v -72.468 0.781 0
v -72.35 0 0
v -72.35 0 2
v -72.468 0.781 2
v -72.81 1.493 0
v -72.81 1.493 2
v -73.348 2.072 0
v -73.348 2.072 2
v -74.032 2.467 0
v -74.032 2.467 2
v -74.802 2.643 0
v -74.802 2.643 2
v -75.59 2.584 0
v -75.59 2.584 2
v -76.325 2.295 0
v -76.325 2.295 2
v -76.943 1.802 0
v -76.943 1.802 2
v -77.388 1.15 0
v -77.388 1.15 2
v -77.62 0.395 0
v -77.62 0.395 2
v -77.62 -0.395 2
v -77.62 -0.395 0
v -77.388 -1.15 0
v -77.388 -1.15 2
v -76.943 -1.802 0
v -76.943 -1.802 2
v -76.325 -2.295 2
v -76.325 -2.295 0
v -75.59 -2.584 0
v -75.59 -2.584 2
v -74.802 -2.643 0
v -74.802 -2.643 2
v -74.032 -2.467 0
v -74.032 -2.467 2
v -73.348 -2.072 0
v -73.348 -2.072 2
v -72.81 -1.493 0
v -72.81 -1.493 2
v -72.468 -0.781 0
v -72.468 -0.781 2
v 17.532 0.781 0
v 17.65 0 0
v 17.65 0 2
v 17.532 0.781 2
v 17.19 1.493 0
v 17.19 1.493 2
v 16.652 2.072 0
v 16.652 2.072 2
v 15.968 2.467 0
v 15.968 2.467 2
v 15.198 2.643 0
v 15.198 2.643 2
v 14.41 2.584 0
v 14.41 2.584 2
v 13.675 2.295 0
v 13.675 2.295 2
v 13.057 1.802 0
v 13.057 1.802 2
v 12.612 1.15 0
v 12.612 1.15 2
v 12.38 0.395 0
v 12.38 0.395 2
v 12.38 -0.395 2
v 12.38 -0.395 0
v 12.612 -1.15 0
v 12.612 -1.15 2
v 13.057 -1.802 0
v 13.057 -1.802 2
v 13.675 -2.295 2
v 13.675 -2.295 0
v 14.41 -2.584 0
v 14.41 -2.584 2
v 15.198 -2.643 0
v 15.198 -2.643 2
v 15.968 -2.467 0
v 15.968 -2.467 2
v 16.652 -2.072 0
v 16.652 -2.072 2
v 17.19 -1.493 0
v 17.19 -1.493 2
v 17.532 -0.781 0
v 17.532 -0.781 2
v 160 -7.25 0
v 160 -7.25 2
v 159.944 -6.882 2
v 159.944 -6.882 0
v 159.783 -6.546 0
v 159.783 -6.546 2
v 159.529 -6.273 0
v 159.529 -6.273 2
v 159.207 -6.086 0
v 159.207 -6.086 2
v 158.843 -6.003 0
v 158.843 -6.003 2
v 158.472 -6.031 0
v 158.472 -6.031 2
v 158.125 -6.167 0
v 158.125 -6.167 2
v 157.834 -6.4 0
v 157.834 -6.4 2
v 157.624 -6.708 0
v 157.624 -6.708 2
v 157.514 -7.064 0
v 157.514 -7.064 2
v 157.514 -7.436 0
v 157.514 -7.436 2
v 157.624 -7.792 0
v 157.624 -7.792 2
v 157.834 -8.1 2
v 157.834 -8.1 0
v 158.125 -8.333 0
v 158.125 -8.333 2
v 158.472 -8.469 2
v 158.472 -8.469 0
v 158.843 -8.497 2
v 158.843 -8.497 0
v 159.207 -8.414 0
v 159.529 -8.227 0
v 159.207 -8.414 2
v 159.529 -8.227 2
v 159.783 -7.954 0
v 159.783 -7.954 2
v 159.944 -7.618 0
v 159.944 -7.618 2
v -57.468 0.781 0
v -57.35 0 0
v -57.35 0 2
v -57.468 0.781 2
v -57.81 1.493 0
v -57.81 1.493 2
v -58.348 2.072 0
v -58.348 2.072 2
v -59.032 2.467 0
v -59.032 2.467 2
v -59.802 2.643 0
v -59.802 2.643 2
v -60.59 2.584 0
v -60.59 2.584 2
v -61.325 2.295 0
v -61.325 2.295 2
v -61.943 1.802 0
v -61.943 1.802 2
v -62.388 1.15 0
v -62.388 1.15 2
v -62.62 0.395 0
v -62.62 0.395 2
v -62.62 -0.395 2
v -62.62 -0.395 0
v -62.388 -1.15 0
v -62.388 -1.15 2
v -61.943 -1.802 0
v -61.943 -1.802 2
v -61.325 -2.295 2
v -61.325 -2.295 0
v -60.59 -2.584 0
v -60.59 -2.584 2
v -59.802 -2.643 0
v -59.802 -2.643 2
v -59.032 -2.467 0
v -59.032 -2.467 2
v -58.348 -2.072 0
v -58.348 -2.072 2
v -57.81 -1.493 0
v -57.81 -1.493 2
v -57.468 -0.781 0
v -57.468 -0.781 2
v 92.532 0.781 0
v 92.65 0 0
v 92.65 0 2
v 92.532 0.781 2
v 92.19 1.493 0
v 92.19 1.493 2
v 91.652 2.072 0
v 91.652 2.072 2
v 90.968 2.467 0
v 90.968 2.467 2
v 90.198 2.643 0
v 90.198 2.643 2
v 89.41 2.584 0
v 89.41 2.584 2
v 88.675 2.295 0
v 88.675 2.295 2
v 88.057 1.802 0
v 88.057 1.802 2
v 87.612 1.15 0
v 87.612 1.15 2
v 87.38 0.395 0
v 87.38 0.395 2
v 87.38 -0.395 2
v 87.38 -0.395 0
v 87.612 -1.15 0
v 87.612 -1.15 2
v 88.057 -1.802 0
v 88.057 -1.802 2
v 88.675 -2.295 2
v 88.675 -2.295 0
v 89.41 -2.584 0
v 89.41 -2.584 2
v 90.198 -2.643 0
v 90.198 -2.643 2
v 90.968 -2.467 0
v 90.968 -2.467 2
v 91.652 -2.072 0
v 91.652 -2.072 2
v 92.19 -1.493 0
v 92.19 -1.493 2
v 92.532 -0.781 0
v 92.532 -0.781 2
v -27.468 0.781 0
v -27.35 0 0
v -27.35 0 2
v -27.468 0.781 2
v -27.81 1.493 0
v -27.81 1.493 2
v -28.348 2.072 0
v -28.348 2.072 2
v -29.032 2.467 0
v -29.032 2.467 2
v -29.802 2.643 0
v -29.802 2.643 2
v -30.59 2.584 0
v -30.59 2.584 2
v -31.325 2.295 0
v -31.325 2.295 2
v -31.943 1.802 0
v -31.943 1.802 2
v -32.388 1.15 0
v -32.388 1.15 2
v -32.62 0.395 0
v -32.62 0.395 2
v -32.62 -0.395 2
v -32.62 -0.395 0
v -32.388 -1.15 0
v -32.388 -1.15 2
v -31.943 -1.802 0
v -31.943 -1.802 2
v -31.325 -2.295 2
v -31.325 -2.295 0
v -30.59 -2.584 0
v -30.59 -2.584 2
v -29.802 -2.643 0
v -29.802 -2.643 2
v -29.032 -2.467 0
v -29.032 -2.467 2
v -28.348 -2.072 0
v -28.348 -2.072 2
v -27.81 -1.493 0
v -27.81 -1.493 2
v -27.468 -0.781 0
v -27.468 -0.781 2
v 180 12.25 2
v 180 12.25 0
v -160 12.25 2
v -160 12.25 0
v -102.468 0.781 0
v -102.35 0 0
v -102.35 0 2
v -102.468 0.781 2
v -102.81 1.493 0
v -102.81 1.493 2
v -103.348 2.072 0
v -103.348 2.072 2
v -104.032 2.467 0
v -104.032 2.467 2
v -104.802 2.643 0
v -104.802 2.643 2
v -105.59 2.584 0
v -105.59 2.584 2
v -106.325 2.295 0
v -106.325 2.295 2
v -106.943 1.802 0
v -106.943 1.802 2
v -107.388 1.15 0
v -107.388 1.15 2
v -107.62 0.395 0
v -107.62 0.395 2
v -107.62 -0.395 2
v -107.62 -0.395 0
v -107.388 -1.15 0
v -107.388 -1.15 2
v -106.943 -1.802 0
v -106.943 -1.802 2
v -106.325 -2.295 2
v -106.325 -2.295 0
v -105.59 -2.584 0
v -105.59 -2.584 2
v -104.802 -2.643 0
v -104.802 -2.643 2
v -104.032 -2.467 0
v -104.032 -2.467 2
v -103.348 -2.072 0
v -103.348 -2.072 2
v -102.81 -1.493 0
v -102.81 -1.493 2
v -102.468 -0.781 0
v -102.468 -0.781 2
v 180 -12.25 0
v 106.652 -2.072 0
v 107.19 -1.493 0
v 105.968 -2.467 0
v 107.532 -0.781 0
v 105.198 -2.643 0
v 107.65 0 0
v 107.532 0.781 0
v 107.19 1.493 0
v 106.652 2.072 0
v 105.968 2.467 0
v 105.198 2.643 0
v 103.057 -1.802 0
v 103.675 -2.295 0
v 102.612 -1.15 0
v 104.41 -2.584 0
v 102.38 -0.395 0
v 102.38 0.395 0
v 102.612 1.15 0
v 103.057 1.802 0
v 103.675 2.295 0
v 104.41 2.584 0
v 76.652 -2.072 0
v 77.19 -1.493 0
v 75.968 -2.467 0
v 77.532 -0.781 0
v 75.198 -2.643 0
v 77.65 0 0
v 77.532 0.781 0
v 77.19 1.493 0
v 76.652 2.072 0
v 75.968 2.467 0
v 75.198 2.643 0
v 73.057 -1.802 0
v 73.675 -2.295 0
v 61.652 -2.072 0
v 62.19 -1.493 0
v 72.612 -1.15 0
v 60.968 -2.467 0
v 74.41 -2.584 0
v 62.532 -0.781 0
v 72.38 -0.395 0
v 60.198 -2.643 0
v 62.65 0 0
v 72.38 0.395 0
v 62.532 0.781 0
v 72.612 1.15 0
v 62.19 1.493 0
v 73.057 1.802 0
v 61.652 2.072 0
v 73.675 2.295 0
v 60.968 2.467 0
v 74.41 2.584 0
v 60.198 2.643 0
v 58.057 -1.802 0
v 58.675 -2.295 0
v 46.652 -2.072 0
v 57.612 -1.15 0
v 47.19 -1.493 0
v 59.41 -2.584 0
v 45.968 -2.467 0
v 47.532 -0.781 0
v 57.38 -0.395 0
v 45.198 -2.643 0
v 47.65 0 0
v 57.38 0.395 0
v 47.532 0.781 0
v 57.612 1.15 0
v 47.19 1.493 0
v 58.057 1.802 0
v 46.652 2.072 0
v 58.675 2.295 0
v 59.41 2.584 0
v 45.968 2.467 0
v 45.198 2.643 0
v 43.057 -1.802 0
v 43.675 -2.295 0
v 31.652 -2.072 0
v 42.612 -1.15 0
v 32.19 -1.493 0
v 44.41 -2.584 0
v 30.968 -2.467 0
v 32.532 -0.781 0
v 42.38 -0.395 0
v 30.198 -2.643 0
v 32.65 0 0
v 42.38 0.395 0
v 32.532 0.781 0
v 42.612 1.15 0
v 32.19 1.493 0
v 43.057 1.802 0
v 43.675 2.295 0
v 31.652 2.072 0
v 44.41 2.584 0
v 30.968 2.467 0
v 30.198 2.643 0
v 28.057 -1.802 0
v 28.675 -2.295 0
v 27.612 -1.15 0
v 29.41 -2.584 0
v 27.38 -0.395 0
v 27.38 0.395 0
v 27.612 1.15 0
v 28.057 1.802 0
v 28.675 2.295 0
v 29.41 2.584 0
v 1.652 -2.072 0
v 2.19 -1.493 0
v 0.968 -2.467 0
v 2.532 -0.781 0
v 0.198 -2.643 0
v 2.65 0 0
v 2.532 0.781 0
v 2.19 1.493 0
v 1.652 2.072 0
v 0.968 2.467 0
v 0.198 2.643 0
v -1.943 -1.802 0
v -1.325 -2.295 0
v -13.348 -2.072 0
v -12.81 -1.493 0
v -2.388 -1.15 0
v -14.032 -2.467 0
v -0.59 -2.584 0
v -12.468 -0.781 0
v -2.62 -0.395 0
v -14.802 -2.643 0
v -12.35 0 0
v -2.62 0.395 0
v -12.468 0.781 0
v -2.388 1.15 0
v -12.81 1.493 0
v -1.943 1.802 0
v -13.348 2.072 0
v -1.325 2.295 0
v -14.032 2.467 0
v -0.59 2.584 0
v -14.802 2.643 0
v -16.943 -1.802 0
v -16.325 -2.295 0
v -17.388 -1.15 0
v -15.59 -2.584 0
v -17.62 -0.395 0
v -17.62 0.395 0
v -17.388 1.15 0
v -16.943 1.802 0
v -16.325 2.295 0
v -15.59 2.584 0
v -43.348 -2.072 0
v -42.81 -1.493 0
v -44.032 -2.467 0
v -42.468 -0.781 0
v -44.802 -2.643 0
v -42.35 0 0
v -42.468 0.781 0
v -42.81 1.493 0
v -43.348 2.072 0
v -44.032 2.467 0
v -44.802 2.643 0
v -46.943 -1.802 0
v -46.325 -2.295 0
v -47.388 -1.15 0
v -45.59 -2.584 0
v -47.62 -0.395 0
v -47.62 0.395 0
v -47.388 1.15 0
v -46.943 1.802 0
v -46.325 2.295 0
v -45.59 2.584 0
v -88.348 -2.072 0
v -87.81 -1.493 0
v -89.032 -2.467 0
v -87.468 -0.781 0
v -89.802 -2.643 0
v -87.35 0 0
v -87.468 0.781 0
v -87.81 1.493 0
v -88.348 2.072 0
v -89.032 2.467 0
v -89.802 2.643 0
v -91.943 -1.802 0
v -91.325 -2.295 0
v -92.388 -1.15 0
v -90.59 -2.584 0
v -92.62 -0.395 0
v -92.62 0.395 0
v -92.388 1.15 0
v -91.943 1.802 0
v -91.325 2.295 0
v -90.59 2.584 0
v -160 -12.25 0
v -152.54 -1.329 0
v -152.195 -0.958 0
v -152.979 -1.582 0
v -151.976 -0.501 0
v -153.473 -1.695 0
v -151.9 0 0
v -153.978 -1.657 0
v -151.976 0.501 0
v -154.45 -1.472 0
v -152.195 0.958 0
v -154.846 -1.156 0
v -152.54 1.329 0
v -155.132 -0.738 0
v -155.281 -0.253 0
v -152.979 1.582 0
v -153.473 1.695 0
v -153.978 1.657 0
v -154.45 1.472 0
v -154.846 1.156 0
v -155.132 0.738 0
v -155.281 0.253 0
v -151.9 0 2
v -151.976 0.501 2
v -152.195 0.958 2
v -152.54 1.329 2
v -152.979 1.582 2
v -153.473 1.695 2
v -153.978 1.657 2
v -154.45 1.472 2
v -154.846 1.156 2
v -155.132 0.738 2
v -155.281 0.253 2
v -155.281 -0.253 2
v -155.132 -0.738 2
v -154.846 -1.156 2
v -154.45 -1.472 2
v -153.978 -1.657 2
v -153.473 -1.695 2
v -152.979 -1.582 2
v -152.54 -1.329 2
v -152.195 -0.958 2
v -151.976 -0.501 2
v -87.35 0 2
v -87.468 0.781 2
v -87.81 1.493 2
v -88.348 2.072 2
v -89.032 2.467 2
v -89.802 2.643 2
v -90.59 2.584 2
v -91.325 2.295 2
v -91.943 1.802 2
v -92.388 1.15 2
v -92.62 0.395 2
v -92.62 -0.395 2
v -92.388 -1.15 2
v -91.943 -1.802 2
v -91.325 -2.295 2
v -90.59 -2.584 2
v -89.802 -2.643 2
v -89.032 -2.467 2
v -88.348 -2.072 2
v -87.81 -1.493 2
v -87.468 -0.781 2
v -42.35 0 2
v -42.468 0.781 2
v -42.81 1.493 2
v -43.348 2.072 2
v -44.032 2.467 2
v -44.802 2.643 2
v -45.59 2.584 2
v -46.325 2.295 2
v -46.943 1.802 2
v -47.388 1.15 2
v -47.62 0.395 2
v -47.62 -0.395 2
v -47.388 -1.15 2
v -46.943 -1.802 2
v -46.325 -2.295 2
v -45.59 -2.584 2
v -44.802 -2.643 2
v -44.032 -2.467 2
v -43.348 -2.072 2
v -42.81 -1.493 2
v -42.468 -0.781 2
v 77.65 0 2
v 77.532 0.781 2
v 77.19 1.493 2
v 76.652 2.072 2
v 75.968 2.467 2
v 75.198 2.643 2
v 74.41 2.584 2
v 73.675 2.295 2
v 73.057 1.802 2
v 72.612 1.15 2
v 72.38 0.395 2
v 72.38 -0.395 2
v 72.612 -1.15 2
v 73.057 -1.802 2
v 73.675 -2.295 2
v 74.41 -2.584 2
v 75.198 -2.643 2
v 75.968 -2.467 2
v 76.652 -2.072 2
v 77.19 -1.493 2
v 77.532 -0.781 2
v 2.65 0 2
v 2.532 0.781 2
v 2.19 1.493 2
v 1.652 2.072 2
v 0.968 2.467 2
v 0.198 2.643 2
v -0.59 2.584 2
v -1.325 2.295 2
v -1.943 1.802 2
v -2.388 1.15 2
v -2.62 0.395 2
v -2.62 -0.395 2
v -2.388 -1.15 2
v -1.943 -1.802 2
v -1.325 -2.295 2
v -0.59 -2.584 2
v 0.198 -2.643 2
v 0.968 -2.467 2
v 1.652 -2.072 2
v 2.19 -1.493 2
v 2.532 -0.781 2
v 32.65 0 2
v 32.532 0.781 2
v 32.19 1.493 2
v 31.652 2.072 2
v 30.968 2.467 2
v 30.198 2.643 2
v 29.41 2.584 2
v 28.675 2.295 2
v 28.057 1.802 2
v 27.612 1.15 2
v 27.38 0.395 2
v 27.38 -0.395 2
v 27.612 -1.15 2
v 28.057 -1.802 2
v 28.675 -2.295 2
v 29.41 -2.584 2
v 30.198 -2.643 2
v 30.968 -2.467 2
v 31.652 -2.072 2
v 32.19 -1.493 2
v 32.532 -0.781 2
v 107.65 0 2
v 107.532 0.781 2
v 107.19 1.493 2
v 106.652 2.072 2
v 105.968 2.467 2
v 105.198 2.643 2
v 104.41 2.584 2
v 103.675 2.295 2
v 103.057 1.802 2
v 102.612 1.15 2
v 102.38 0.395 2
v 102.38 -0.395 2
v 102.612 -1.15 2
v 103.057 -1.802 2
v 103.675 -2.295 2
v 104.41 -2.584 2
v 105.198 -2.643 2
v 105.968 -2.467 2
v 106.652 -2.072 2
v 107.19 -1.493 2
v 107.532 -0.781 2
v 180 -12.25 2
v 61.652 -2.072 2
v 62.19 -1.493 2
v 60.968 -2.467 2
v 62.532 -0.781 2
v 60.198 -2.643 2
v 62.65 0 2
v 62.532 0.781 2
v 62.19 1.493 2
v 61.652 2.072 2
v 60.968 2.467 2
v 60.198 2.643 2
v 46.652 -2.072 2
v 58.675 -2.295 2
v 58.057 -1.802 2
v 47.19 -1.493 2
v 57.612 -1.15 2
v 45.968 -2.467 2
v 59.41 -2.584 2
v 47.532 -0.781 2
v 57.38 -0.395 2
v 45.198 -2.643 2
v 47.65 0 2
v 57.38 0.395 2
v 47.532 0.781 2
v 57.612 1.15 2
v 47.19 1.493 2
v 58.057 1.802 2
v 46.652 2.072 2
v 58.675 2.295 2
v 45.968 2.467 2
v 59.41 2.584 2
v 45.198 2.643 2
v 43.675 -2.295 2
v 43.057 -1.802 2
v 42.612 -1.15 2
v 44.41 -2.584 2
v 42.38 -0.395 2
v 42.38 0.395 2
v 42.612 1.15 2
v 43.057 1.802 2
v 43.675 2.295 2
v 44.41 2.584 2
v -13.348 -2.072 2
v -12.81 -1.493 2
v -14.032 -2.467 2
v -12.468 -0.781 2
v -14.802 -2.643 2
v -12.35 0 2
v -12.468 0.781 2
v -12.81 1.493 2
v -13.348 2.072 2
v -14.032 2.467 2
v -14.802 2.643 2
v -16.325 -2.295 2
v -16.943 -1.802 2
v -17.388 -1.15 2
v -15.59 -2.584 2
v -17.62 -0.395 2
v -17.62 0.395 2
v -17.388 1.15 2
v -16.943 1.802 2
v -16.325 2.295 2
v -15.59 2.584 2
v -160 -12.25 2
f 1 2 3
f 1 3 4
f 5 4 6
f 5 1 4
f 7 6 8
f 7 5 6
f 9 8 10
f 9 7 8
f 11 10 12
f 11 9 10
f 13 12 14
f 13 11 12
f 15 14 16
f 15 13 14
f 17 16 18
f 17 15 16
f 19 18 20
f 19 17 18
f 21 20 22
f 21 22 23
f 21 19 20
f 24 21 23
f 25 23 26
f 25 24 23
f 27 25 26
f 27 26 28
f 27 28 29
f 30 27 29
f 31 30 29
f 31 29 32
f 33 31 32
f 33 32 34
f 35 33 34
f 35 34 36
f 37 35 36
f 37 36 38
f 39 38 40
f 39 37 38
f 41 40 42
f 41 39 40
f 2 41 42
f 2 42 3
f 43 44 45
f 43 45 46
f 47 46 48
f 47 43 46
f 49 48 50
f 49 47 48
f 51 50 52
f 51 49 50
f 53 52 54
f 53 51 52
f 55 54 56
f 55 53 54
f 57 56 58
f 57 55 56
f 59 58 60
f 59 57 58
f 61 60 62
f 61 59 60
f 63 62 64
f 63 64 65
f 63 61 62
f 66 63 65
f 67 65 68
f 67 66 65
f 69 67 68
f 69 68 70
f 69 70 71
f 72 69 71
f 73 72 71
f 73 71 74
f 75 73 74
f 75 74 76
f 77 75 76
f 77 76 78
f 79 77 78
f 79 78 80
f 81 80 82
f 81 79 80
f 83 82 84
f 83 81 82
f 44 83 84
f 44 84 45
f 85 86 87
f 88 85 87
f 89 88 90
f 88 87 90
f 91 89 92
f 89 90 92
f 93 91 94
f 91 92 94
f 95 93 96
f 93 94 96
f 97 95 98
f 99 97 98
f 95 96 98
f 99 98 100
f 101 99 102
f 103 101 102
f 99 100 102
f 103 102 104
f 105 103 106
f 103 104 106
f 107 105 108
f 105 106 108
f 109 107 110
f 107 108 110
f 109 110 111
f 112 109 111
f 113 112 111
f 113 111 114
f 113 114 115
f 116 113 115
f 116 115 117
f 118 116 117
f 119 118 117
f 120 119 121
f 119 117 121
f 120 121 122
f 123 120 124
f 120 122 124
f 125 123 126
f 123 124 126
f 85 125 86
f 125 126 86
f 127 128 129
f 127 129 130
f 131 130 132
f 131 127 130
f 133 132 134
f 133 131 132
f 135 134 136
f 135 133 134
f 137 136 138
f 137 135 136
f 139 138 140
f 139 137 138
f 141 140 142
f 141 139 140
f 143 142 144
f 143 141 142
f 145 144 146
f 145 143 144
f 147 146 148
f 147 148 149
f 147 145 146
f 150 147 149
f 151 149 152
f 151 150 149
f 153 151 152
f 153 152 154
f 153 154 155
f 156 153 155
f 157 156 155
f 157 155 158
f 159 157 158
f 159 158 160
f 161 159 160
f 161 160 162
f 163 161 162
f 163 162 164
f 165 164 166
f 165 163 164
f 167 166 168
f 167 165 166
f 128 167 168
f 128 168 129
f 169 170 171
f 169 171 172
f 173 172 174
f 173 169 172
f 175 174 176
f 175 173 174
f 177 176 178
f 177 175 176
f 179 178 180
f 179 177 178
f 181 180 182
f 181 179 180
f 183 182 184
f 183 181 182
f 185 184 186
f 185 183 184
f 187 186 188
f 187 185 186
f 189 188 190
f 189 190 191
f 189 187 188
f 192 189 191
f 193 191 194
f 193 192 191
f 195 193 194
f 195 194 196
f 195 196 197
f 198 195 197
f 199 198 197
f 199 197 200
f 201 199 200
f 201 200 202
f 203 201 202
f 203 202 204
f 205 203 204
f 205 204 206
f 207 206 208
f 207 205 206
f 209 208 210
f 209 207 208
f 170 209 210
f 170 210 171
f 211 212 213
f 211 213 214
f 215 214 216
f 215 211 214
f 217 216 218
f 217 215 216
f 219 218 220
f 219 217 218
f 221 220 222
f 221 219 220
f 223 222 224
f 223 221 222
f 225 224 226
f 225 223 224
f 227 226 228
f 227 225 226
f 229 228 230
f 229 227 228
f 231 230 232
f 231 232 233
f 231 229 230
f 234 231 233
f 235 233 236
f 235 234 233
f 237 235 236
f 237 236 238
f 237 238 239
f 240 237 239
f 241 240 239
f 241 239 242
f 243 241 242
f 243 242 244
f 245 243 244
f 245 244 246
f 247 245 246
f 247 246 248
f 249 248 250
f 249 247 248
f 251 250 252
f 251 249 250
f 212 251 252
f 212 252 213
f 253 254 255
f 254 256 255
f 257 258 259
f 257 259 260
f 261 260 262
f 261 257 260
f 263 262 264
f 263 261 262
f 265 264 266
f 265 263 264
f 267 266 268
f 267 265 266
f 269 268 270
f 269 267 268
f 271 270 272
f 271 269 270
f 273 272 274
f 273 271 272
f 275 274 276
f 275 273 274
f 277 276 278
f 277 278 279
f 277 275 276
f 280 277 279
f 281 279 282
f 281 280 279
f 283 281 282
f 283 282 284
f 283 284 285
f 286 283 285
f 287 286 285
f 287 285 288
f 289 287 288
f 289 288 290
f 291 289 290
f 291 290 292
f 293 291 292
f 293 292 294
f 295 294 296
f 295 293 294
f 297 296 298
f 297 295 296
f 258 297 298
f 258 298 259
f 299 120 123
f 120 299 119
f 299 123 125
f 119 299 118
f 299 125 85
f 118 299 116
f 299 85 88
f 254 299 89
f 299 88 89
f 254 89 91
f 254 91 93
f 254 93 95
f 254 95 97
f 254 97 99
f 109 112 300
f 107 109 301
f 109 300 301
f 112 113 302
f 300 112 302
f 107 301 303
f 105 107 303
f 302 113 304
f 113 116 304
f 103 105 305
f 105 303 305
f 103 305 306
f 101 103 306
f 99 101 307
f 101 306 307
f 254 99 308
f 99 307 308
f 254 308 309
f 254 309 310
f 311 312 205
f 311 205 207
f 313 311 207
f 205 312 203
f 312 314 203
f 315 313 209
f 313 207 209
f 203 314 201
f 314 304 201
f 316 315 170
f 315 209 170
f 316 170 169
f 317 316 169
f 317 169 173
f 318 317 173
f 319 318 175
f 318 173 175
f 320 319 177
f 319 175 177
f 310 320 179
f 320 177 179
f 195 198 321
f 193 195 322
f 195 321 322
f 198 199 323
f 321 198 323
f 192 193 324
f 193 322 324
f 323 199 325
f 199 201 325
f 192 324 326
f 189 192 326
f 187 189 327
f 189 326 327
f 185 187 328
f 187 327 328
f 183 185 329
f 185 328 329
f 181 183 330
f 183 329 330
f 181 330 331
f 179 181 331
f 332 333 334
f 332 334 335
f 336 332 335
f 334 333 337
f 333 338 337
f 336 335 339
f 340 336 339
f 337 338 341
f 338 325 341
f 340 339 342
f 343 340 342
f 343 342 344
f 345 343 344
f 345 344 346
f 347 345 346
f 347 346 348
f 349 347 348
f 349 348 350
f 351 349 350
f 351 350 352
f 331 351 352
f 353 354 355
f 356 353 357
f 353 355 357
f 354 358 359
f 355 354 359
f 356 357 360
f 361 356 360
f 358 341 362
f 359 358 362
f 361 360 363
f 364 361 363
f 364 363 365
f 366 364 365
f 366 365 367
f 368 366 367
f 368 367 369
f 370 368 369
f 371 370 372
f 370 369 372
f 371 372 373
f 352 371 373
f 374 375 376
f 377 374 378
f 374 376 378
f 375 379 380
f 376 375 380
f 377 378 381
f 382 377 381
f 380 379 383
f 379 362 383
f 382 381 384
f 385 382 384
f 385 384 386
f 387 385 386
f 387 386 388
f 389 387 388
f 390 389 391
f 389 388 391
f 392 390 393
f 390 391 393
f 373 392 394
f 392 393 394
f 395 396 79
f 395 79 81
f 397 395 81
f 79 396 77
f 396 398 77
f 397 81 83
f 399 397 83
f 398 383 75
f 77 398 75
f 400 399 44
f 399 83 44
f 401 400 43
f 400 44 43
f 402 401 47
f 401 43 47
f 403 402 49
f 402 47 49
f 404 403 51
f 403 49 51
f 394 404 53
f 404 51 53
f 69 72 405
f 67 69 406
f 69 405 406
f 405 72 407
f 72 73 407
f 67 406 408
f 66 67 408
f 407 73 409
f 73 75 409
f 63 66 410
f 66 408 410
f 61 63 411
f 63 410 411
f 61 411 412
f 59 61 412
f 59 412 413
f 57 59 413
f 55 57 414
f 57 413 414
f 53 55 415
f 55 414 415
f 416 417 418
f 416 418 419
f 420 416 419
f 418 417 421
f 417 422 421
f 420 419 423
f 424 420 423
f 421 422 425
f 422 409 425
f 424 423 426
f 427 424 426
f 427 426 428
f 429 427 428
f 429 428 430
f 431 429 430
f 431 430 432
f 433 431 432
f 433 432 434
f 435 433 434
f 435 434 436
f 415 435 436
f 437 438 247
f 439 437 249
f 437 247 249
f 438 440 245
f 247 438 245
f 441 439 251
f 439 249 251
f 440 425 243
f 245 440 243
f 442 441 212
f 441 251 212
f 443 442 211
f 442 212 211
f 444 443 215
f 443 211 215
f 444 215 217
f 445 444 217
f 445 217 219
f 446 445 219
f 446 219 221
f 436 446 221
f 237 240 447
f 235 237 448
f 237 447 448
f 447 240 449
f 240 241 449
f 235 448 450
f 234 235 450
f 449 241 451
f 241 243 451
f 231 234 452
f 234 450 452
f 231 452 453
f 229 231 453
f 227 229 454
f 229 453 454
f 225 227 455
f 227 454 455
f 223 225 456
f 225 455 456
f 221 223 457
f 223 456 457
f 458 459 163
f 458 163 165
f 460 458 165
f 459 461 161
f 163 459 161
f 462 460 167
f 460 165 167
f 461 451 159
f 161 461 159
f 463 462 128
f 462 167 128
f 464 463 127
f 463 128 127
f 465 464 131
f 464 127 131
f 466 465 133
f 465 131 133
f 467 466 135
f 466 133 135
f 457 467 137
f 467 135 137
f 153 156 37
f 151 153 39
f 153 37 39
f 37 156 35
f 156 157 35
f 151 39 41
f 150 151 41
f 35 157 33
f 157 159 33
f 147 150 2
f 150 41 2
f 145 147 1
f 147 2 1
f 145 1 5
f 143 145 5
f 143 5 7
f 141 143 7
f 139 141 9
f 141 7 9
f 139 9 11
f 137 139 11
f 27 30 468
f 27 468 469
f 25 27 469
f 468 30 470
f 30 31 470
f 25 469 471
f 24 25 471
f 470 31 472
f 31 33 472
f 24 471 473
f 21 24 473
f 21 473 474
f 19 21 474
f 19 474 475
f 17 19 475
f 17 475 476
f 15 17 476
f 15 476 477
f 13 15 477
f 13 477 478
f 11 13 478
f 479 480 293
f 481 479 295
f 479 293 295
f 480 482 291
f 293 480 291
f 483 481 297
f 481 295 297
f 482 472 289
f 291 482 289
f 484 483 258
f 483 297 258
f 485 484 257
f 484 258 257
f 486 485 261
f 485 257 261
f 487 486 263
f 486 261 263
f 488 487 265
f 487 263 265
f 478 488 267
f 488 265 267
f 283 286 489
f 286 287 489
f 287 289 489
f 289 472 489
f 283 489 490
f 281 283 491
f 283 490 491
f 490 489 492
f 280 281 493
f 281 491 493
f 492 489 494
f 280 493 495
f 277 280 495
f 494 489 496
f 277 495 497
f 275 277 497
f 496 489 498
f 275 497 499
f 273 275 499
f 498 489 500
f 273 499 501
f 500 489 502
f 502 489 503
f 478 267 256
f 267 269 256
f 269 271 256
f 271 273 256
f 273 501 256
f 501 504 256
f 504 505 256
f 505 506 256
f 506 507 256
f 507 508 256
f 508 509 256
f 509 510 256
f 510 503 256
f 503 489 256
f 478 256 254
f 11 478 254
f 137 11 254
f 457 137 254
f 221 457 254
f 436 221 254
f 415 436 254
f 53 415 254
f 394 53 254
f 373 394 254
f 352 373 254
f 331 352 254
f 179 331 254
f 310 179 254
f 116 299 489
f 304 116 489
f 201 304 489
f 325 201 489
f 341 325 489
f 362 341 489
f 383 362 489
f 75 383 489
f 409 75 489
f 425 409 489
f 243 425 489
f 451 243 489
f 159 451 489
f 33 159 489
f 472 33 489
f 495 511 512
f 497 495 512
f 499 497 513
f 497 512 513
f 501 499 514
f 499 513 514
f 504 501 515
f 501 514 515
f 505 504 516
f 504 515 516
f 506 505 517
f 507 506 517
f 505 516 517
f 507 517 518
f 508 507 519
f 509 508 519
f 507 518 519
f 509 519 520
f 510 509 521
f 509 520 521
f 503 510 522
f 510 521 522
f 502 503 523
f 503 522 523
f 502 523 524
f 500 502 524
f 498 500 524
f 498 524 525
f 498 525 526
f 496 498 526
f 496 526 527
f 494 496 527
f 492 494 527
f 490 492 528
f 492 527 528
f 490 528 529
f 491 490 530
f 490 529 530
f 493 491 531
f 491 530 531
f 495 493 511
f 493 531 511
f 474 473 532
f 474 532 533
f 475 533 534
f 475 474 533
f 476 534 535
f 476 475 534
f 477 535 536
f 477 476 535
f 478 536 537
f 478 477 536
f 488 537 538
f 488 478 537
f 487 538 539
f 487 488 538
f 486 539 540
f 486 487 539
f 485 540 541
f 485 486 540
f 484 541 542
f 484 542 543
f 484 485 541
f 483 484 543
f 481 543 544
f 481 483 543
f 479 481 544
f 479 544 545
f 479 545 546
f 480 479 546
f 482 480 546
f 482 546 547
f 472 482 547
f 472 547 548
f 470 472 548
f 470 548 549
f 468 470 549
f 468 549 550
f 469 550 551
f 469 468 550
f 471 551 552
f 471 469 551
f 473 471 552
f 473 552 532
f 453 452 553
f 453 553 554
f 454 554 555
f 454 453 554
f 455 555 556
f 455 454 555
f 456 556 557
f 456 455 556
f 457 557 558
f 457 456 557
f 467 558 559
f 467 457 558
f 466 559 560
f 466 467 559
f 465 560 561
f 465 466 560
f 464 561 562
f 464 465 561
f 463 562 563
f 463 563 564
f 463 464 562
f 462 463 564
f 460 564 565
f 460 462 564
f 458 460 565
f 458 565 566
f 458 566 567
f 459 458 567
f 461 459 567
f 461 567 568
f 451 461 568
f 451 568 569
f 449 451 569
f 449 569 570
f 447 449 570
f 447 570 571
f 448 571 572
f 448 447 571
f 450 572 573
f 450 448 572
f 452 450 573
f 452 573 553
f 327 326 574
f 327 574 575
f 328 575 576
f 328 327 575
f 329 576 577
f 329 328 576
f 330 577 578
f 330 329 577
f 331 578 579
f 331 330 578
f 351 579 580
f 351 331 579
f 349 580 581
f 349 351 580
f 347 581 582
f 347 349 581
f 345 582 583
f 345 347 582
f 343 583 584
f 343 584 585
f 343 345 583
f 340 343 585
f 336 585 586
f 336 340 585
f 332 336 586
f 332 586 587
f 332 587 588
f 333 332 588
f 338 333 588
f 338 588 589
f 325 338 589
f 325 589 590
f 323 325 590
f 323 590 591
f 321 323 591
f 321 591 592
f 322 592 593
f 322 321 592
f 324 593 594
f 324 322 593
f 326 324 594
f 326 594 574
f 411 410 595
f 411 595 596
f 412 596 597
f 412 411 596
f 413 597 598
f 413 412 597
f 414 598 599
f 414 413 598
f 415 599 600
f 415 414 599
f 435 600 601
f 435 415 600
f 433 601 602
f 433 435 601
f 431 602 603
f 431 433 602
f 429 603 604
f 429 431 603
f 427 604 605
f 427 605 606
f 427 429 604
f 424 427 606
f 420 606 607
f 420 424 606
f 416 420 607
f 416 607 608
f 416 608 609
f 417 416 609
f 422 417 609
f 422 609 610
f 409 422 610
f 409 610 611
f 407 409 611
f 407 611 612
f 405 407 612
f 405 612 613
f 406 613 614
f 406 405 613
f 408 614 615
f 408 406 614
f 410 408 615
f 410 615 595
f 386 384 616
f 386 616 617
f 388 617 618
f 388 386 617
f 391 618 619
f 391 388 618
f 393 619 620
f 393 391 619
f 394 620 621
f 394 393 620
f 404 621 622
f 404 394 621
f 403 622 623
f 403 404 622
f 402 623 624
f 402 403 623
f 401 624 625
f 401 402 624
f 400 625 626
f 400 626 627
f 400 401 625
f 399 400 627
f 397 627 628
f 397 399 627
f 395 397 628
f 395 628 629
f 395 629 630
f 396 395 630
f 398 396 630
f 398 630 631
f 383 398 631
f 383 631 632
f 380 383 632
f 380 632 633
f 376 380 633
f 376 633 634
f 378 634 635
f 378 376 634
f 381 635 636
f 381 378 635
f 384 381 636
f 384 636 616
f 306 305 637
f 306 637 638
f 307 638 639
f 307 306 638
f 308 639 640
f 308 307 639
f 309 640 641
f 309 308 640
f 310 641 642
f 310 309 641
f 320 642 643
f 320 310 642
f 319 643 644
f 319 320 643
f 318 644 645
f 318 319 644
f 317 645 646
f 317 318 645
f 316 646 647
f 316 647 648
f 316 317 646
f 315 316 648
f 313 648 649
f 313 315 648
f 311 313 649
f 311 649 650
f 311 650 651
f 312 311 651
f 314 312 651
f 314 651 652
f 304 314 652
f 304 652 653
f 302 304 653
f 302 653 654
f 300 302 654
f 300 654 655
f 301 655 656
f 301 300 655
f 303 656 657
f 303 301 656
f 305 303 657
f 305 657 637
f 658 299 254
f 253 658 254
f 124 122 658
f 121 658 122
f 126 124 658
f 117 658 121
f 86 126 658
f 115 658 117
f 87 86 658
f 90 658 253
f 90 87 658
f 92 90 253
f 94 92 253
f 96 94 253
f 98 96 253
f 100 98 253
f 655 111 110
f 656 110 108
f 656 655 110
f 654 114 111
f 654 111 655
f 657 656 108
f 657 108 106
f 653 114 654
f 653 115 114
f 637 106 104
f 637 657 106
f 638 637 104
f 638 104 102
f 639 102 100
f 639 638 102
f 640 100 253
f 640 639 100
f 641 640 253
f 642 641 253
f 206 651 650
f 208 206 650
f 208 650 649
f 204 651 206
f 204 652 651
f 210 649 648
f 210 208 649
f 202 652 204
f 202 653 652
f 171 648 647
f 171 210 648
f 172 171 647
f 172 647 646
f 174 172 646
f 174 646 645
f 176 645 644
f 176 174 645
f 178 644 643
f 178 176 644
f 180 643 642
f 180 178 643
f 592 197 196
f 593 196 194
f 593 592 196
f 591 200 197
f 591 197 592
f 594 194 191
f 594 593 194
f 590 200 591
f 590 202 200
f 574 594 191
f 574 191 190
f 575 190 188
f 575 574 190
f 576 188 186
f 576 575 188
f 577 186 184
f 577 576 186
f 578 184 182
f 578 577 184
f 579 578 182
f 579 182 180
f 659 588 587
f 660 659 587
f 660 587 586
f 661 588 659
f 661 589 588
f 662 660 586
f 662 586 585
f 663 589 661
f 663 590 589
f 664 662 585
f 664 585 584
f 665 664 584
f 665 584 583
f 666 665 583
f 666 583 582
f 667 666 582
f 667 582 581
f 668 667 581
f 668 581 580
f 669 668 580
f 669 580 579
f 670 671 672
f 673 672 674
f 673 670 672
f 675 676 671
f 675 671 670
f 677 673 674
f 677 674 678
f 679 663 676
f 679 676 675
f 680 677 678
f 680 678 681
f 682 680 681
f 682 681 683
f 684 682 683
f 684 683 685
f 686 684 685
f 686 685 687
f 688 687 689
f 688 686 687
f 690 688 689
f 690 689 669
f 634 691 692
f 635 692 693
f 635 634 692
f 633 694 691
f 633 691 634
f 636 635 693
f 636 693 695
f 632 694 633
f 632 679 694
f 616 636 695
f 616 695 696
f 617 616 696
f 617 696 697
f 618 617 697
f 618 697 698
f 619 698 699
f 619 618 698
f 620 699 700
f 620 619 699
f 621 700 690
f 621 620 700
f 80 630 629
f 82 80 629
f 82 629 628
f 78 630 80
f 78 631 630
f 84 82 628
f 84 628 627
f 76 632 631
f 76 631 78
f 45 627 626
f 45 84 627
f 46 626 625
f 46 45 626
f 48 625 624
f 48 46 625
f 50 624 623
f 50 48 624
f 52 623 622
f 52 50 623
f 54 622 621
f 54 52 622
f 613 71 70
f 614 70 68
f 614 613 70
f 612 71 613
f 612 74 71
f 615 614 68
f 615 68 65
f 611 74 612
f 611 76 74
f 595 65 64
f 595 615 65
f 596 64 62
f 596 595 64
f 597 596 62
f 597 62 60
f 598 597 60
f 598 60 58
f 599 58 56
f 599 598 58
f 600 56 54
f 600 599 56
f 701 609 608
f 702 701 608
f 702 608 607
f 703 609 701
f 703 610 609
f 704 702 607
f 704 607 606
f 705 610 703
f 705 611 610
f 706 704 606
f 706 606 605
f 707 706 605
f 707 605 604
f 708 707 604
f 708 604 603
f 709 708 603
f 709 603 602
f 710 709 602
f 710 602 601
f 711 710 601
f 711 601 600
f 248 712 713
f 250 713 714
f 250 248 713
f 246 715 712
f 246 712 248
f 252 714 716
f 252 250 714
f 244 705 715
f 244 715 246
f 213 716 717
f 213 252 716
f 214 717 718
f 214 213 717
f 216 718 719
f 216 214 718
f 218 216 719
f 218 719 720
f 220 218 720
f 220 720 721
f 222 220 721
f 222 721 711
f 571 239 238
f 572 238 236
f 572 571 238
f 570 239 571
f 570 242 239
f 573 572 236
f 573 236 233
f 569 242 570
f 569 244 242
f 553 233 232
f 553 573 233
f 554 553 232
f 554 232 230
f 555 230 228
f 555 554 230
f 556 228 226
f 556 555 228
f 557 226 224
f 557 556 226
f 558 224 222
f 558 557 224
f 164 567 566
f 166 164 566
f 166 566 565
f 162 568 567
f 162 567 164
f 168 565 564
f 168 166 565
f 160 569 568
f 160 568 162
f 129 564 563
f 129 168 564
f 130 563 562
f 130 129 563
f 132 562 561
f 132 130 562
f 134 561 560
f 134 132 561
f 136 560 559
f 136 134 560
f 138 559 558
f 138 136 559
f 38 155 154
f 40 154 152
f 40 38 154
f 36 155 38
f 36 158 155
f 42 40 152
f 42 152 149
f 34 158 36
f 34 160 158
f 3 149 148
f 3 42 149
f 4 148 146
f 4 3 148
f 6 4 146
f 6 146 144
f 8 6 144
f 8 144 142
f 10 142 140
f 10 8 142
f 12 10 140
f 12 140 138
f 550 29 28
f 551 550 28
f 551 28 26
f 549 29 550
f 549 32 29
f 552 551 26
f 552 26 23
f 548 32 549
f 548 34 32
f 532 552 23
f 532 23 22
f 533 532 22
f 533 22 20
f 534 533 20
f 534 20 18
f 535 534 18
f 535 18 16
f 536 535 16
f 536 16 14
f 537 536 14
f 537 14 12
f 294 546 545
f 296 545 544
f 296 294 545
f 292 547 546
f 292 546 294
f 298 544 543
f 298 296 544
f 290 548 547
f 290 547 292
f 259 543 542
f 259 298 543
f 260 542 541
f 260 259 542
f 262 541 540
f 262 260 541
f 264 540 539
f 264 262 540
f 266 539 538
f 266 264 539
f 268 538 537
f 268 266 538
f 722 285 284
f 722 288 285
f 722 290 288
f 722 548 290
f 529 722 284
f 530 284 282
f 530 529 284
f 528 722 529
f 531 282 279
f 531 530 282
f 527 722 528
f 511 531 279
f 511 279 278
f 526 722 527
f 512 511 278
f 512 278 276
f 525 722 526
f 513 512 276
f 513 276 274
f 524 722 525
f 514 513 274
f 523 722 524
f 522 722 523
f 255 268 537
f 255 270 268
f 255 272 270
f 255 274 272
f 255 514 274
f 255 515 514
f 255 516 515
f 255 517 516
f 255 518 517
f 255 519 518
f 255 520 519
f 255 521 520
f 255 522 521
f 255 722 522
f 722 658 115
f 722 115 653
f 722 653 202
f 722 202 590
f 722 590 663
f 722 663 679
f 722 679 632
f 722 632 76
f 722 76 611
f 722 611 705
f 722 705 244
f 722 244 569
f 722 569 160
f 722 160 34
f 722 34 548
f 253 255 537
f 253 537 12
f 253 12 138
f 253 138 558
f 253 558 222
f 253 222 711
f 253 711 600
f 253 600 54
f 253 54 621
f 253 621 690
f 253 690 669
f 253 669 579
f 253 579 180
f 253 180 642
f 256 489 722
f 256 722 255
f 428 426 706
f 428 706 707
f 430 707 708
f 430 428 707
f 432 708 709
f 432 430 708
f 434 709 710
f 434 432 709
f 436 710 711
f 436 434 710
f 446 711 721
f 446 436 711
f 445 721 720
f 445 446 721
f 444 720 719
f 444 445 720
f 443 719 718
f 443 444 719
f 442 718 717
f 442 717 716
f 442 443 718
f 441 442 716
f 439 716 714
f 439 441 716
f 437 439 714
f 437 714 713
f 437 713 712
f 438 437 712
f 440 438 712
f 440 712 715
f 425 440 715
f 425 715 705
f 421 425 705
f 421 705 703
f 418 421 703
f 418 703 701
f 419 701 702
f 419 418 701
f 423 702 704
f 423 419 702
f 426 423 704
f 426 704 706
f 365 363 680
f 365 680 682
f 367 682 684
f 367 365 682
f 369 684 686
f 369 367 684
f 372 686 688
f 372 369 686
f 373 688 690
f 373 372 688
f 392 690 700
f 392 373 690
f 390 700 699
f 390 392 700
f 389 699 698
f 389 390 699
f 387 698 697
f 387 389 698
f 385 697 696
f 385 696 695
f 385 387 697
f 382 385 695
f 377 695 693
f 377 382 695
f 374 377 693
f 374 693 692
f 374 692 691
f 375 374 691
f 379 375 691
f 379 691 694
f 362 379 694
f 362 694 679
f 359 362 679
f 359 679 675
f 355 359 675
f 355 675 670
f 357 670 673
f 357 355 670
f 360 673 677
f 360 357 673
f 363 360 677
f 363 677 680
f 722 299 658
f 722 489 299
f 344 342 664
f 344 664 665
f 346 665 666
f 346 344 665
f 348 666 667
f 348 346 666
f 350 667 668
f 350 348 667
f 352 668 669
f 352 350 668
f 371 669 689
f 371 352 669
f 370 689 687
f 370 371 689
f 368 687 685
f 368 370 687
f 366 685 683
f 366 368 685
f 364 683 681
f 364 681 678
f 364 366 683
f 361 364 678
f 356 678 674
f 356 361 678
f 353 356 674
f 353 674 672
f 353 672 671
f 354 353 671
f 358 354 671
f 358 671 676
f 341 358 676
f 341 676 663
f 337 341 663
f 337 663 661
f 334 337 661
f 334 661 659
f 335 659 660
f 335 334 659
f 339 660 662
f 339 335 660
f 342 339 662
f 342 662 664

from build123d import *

# Parameters (mm, degrees)
F0_W     = 300
F0_H     = 24.5
F0_R     = 2.65
F1_DEPTH = 2
F2_DEPTH = 10
F3_DEPTH = 30
F4_R     = 1.7
F5_DEPTH = 2
F6_R     = 1.25
F7_DEPTH = 2


with BuildPart() as f1:
    # F0 (on Top) → F1 (new body)
    with BuildSketch(Plane.XY):
        Rectangle(F0_W, F0_H)
        with Locations((-105, 0)):
            Circle(F0_R, mode=Mode.SUBTRACT)
        with Locations((-90, 0)):
            Circle(F0_R, mode=Mode.SUBTRACT)
        with Locations((-75, 0)):
            Circle(F0_R, mode=Mode.SUBTRACT)
        with Locations((-60, 0)):
            Circle(F0_R, mode=Mode.SUBTRACT)
        with Locations((-45, 0)):
            Circle(F0_R, mode=Mode.SUBTRACT)
        with Locations((-30, 0)):
            Circle(F0_R, mode=Mode.SUBTRACT)
        with Locations((-15, 0)):
            Circle(F0_R, mode=Mode.SUBTRACT)
        Circle(F0_R, mode=Mode.SUBTRACT)
        with Locations((15, 0)):
            Circle(F0_R, mode=Mode.SUBTRACT)
        with Locations((30, 0)):
            Circle(F0_R, mode=Mode.SUBTRACT)
        with Locations((45, 0)):
            Circle(F0_R, mode=Mode.SUBTRACT)
        with Locations((60, 0)):
            Circle(F0_R, mode=Mode.SUBTRACT)
        with Locations((75, 0)):
            Circle(F0_R, mode=Mode.SUBTRACT)
        with Locations((90, 0)):
            Circle(F0_R, mode=Mode.SUBTRACT)
        with Locations((105, 0)):
            Circle(F0_R, mode=Mode.SUBTRACT)
    extrude(amount=F1_DEPTH)

    # F2 (add): a face of the model
    f2_faces = [f1.faces().sort_by_distance(p)[0] for p in [
        (-150, 0, 1),
    ]]
    extrude(f2_faces, amount=F2_DEPTH)

    # F3 (add): a face of the model
    f3_faces = [f1.faces().sort_by_distance(p)[0] for p in [
        (150, 0, 1),
    ]]
    extrude(f3_faces, amount=F3_DEPTH)

    # F4 (on face) → F5 (cut, through all)
    with BuildSketch(Plane.XY.offset(2)):
        with Locations((-153.6, 0)):
            Circle(F4_R)
    extrude(amount=-F5_DEPTH, mode=Mode.SUBTRACT)

    # F6 (on face) → F7 (cut, through all)
    with BuildSketch(Plane.XY.offset(2)):
        with Locations((158.75, -7.25)):
            Circle(F6_R)
    extrude(amount=-F7_DEPTH, mode=Mode.SUBTRACT)


solid = f1.part
